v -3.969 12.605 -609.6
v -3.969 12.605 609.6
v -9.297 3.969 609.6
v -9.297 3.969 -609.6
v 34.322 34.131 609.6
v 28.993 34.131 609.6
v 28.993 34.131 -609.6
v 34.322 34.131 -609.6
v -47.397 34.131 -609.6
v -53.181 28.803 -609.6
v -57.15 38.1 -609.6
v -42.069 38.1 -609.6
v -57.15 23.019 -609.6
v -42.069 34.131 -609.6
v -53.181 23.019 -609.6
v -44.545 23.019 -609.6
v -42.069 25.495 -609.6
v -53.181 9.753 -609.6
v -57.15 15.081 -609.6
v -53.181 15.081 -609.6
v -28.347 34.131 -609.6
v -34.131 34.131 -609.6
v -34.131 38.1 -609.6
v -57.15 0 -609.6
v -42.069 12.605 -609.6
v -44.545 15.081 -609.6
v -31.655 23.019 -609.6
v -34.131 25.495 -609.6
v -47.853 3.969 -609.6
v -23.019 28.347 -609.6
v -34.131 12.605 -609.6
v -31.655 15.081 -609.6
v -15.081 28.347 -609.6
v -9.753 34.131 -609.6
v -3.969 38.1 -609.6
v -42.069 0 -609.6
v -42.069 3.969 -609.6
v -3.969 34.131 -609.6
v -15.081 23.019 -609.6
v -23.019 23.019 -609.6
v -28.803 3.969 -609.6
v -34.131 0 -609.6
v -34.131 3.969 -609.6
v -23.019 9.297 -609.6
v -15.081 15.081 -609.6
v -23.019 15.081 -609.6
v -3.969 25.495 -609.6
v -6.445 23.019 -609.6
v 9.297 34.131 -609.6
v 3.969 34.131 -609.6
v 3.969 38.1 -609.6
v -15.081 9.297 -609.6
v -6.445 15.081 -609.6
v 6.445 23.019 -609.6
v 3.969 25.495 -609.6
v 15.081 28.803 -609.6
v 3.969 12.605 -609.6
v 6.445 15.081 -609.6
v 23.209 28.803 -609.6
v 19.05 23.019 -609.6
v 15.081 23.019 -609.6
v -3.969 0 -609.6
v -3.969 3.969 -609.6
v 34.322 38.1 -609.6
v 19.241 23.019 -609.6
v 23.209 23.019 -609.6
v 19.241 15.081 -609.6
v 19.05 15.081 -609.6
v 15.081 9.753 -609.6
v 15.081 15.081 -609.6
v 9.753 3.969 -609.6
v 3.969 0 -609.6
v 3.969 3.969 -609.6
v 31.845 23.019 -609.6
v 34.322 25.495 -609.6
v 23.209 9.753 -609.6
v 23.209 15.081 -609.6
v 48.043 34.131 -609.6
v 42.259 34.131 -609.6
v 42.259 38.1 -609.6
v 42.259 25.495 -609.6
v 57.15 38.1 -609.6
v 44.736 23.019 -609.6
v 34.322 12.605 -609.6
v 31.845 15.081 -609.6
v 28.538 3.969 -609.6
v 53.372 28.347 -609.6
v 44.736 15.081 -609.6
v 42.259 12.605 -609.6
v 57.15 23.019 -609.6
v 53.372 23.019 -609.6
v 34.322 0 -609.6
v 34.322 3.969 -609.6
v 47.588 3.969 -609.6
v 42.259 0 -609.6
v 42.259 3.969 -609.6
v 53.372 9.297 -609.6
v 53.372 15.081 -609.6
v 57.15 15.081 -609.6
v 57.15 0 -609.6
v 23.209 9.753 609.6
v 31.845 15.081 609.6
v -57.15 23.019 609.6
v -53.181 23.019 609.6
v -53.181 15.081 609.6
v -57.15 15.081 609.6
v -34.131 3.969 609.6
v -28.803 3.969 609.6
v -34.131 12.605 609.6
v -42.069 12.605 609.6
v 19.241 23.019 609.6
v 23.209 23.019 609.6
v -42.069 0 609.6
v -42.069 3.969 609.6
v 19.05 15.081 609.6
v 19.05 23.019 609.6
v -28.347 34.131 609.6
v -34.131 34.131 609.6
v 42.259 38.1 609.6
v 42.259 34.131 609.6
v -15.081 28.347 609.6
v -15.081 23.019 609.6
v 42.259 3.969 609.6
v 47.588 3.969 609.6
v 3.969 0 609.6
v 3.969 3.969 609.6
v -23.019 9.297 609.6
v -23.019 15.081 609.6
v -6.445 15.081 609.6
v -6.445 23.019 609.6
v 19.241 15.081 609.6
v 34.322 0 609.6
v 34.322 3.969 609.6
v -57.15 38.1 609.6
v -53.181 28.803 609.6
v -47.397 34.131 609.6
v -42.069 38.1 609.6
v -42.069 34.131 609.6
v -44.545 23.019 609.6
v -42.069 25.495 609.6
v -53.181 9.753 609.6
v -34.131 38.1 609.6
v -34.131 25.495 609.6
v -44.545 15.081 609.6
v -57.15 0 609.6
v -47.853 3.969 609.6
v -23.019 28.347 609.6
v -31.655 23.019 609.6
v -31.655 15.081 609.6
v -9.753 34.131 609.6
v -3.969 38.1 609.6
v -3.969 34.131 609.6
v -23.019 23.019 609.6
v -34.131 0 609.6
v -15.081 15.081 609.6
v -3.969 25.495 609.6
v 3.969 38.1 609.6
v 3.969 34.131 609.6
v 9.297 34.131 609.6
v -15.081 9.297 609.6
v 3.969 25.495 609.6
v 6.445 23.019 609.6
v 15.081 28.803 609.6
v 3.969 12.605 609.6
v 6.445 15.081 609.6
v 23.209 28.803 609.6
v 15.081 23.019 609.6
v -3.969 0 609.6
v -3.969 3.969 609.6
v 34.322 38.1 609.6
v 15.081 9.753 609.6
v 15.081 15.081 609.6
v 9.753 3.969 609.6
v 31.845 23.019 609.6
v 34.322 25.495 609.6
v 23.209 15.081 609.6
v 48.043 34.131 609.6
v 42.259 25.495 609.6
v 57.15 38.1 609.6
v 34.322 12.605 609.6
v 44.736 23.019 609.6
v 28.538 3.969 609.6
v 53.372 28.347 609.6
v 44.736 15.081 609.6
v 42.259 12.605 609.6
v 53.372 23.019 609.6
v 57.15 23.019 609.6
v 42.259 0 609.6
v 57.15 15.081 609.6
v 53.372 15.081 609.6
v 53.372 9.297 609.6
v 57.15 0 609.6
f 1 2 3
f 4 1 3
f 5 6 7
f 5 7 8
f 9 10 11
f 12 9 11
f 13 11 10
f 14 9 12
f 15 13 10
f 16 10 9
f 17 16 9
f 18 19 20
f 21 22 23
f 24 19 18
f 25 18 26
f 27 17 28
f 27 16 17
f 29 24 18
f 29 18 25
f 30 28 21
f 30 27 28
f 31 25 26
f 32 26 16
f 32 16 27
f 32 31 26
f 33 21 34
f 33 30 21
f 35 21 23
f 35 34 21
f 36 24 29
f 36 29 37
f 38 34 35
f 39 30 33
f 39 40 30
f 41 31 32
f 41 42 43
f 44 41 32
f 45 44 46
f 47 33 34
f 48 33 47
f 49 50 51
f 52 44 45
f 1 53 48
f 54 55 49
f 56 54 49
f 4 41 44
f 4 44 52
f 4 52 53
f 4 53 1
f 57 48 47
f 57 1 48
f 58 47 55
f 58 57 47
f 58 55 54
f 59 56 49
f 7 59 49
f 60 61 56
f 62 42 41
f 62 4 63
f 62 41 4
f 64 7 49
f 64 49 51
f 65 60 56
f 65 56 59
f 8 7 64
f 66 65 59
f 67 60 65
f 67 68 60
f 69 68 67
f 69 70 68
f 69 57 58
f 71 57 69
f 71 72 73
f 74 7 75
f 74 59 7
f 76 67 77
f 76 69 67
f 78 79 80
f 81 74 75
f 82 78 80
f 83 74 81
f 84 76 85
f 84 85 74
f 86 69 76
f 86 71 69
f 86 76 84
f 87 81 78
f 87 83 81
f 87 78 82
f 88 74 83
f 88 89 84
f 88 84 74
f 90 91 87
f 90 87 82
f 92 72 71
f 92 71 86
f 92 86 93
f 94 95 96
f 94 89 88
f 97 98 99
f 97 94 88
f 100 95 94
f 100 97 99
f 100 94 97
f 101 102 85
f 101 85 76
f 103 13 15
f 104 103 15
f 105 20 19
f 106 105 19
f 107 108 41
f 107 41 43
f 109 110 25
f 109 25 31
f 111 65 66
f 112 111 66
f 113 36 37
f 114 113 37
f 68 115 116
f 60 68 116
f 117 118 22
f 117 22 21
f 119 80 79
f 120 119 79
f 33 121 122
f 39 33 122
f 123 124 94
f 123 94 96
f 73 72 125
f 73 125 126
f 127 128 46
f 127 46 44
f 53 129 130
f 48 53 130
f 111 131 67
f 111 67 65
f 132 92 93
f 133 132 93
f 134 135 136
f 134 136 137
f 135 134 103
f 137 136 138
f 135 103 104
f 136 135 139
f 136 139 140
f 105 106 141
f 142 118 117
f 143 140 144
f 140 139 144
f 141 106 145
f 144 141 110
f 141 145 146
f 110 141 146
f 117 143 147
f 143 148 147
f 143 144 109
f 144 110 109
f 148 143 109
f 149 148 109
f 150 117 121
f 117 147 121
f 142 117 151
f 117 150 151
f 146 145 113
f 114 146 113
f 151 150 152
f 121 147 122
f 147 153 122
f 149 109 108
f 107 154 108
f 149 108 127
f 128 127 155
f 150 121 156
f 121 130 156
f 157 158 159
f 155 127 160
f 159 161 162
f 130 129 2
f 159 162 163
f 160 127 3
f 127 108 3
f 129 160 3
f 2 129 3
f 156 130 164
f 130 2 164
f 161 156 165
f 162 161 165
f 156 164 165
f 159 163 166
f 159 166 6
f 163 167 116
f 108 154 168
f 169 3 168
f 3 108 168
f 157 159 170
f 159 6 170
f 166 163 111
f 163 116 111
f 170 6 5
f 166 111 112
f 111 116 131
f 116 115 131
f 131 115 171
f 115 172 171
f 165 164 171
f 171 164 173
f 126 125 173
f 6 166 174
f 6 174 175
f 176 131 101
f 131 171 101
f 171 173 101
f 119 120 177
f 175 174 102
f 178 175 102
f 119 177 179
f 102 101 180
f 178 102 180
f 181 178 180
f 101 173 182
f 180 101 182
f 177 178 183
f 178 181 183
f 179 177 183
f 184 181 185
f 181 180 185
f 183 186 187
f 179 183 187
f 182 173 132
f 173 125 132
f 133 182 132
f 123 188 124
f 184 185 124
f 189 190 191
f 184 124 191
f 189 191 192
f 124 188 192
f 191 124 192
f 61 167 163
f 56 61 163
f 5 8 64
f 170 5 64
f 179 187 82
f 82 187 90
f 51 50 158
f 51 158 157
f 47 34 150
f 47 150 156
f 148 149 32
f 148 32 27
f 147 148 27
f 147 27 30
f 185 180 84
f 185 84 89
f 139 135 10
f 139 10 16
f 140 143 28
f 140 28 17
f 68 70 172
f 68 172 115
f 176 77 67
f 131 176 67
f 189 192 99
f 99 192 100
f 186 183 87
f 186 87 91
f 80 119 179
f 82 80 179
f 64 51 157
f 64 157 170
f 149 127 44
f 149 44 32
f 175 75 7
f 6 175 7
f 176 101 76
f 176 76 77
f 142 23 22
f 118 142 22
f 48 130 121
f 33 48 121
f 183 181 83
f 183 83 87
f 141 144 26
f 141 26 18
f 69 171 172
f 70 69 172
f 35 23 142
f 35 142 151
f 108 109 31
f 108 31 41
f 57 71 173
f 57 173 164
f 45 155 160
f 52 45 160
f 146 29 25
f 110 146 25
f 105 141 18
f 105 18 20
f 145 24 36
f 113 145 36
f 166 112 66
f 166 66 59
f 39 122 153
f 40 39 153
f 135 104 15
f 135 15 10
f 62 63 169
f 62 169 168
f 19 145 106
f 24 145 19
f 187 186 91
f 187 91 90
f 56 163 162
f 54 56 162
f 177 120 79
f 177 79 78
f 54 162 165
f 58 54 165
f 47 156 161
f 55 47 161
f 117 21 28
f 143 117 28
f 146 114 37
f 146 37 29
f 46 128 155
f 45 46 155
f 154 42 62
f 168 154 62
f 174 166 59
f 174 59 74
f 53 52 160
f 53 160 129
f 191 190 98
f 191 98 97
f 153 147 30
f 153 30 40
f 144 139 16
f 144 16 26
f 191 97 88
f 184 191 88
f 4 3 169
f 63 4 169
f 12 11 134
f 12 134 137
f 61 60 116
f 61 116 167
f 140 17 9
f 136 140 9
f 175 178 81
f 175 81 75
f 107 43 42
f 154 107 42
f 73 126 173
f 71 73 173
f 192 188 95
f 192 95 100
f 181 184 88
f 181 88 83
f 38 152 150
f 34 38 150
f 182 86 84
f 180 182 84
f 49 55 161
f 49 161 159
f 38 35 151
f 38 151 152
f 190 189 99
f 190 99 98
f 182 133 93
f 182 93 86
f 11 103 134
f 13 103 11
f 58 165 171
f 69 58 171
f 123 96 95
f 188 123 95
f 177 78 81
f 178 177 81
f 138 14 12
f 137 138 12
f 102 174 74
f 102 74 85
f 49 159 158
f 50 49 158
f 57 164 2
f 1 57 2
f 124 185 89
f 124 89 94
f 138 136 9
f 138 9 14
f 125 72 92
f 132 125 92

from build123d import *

# Parameters (mm, degrees)
SKETCH1_W            = 114.3
SKETCH1_H            = 1219.2
BASE_EXTRUDE_DEPTH   = 38.1
CUT_EXTRUDE1_DEPTH   = 1220.2
MIRROR2_COPY_1_DEPTH = 1220.2
MIRROR2_COPY_2_DEPTH = 1220.2


with BuildPart() as part:
    # Sketch1 → Base Extrude (new body)
    with BuildSketch(Plane(origin=(0, 0, 0), x_dir=(1, 0, 0), z_dir=(0, 1, 0))):
        Rectangle(SKETCH1_W, SKETCH1_H)
    extrude(amount=BASE_EXTRUDE_DEPTH)

    # Sketch3 → Cut-Extrude1 (cut, through all)
    with BuildSketch(Plane.XY.offset(609.6)):
        Polygon((-42.06875, 38.1), (-34.13125, 38.1), (-34.13125, 34.13125), (-28.347265172, 34.13125), (-34.13125, 25.49525), (-42.06875, 25.49525), (-47.397265172, 34.13125), (-42.06875, 34.13125), align=None)
        Polygon((-23.01875, 28.347265172), (-23.01875, 23.01875), (-19.05, 23.01875), (-19.05, 15.08125), (-23.01875, 15.08125), (-23.01875, 9.297265172), (-31.65475, 15.08125), (-31.65475, 23.01875), align=None)
        Polygon((-28.802734828, 3.96875), (-34.13125, 3.96875), (-34.13125, 0), (-42.06875, 0), (-42.06875, 3.96875), (-47.852734828, 3.96875), (-42.06875, 12.60475), (-34.13125, 12.60475), align=None)
        Polygon((-53.18125, 9.752734828), (-53.18125, 15.08125), (-57.15, 15.08125), (-57.15, 23.01875), (-53.18125, 23.01875), (-53.18125, 28.802734828), (-44.54525, 23.01875), (-44.54525, 15.08125), align=None)
    cut_extrude1 = extrude(amount=-CUT_EXTRUDE1_DEPTH, mode=Mode.SUBTRACT)

    # Mirror1: Cut-Extrude1 across plane
    add(cut_extrude1.mirror(Plane.ZY.offset(19.05)), mode=Mode.SUBTRACT)

    # Mirror2 copy 1 sketch → Mirror2 copy 1 (cut, through all)
    with BuildSketch(Plane(origin=(76.3905, 0, 609.6), x_dir=(1, 0, 0), z_dir=(0, 0, 1))):
        Polygon((-42.06875, 38.1), (-34.13125, 38.1), (-34.13125, 34.13125), (-28.347265172, 34.13125), (-34.13125, 25.49525), (-42.06875, 25.49525), (-47.397265172, 34.13125), (-42.06875, 34.13125), align=None)
        Polygon((-23.01875, 28.347265172), (-23.01875, 23.01875), (-19.05, 23.01875), (-19.05, 15.08125), (-23.01875, 15.08125), (-23.01875, 9.297265172), (-31.65475, 15.08125), (-31.65475, 23.01875), align=None)
        Polygon((-28.802734828, 3.96875), (-34.13125, 3.96875), (-34.13125, 0), (-42.06875, 0), (-42.06875, 3.96875), (-47.852734828, 3.96875), (-42.06875, 12.60475), (-34.13125, 12.60475), align=None)
        Polygon((-53.18125, 9.752734828), (-53.18125, 15.08125), (-57.15, 15.08125), (-57.15, 23.01875), (-53.18125, 23.01875), (-53.18125, 28.802734828), (-44.54525, 23.01875), (-44.54525, 15.08125), align=None)
    extrude(amount=-MIRROR2_COPY_1_DEPTH, mode=Mode.SUBTRACT)

    # Mirror2 copy 2 sketch → Mirror2 copy 2 (cut, through all)
    with BuildSketch(Plane(origin=(38.2905, 0, 609.6), x_dir=(-1, 0, 0), z_dir=(0, 0, 1))):
        Polygon((-42.06875, -38.1), (-34.13125, -38.1), (-34.13125, -34.13125), (-28.347265172, -34.13125), (-34.13125, -25.49525), (-42.06875, -25.49525), (-47.397265172, -34.13125), (-42.06875, -34.13125), align=None)
        Polygon((-23.01875, -28.347265172), (-23.01875, -23.01875), (-19.05, -23.01875), (-19.05, -15.08125), (-23.01875, -15.08125), (-23.01875, -9.297265172), (-31.65475, -15.08125), (-31.65475, -23.01875), align=None)
        Polygon((-28.802734828, -3.96875), (-34.13125, -3.96875), (-34.13125, 0), (-42.06875, 0), (-42.06875, -3.96875), (-47.852734828, -3.96875), (-42.06875, -12.60475), (-34.13125, -12.60475), align=None)
        Polygon((-53.18125, -9.752734828), (-53.18125, -15.08125), (-57.15, -15.08125), (-57.15, -23.01875), (-53.18125, -23.01875), (-53.18125, -28.802734828), (-44.54525, -23.01875), (-44.54525, -15.08125), align=None)
    extrude(amount=-MIRROR2_COPY_2_DEPTH, mode=Mode.SUBTRACT)


solid = part.part
